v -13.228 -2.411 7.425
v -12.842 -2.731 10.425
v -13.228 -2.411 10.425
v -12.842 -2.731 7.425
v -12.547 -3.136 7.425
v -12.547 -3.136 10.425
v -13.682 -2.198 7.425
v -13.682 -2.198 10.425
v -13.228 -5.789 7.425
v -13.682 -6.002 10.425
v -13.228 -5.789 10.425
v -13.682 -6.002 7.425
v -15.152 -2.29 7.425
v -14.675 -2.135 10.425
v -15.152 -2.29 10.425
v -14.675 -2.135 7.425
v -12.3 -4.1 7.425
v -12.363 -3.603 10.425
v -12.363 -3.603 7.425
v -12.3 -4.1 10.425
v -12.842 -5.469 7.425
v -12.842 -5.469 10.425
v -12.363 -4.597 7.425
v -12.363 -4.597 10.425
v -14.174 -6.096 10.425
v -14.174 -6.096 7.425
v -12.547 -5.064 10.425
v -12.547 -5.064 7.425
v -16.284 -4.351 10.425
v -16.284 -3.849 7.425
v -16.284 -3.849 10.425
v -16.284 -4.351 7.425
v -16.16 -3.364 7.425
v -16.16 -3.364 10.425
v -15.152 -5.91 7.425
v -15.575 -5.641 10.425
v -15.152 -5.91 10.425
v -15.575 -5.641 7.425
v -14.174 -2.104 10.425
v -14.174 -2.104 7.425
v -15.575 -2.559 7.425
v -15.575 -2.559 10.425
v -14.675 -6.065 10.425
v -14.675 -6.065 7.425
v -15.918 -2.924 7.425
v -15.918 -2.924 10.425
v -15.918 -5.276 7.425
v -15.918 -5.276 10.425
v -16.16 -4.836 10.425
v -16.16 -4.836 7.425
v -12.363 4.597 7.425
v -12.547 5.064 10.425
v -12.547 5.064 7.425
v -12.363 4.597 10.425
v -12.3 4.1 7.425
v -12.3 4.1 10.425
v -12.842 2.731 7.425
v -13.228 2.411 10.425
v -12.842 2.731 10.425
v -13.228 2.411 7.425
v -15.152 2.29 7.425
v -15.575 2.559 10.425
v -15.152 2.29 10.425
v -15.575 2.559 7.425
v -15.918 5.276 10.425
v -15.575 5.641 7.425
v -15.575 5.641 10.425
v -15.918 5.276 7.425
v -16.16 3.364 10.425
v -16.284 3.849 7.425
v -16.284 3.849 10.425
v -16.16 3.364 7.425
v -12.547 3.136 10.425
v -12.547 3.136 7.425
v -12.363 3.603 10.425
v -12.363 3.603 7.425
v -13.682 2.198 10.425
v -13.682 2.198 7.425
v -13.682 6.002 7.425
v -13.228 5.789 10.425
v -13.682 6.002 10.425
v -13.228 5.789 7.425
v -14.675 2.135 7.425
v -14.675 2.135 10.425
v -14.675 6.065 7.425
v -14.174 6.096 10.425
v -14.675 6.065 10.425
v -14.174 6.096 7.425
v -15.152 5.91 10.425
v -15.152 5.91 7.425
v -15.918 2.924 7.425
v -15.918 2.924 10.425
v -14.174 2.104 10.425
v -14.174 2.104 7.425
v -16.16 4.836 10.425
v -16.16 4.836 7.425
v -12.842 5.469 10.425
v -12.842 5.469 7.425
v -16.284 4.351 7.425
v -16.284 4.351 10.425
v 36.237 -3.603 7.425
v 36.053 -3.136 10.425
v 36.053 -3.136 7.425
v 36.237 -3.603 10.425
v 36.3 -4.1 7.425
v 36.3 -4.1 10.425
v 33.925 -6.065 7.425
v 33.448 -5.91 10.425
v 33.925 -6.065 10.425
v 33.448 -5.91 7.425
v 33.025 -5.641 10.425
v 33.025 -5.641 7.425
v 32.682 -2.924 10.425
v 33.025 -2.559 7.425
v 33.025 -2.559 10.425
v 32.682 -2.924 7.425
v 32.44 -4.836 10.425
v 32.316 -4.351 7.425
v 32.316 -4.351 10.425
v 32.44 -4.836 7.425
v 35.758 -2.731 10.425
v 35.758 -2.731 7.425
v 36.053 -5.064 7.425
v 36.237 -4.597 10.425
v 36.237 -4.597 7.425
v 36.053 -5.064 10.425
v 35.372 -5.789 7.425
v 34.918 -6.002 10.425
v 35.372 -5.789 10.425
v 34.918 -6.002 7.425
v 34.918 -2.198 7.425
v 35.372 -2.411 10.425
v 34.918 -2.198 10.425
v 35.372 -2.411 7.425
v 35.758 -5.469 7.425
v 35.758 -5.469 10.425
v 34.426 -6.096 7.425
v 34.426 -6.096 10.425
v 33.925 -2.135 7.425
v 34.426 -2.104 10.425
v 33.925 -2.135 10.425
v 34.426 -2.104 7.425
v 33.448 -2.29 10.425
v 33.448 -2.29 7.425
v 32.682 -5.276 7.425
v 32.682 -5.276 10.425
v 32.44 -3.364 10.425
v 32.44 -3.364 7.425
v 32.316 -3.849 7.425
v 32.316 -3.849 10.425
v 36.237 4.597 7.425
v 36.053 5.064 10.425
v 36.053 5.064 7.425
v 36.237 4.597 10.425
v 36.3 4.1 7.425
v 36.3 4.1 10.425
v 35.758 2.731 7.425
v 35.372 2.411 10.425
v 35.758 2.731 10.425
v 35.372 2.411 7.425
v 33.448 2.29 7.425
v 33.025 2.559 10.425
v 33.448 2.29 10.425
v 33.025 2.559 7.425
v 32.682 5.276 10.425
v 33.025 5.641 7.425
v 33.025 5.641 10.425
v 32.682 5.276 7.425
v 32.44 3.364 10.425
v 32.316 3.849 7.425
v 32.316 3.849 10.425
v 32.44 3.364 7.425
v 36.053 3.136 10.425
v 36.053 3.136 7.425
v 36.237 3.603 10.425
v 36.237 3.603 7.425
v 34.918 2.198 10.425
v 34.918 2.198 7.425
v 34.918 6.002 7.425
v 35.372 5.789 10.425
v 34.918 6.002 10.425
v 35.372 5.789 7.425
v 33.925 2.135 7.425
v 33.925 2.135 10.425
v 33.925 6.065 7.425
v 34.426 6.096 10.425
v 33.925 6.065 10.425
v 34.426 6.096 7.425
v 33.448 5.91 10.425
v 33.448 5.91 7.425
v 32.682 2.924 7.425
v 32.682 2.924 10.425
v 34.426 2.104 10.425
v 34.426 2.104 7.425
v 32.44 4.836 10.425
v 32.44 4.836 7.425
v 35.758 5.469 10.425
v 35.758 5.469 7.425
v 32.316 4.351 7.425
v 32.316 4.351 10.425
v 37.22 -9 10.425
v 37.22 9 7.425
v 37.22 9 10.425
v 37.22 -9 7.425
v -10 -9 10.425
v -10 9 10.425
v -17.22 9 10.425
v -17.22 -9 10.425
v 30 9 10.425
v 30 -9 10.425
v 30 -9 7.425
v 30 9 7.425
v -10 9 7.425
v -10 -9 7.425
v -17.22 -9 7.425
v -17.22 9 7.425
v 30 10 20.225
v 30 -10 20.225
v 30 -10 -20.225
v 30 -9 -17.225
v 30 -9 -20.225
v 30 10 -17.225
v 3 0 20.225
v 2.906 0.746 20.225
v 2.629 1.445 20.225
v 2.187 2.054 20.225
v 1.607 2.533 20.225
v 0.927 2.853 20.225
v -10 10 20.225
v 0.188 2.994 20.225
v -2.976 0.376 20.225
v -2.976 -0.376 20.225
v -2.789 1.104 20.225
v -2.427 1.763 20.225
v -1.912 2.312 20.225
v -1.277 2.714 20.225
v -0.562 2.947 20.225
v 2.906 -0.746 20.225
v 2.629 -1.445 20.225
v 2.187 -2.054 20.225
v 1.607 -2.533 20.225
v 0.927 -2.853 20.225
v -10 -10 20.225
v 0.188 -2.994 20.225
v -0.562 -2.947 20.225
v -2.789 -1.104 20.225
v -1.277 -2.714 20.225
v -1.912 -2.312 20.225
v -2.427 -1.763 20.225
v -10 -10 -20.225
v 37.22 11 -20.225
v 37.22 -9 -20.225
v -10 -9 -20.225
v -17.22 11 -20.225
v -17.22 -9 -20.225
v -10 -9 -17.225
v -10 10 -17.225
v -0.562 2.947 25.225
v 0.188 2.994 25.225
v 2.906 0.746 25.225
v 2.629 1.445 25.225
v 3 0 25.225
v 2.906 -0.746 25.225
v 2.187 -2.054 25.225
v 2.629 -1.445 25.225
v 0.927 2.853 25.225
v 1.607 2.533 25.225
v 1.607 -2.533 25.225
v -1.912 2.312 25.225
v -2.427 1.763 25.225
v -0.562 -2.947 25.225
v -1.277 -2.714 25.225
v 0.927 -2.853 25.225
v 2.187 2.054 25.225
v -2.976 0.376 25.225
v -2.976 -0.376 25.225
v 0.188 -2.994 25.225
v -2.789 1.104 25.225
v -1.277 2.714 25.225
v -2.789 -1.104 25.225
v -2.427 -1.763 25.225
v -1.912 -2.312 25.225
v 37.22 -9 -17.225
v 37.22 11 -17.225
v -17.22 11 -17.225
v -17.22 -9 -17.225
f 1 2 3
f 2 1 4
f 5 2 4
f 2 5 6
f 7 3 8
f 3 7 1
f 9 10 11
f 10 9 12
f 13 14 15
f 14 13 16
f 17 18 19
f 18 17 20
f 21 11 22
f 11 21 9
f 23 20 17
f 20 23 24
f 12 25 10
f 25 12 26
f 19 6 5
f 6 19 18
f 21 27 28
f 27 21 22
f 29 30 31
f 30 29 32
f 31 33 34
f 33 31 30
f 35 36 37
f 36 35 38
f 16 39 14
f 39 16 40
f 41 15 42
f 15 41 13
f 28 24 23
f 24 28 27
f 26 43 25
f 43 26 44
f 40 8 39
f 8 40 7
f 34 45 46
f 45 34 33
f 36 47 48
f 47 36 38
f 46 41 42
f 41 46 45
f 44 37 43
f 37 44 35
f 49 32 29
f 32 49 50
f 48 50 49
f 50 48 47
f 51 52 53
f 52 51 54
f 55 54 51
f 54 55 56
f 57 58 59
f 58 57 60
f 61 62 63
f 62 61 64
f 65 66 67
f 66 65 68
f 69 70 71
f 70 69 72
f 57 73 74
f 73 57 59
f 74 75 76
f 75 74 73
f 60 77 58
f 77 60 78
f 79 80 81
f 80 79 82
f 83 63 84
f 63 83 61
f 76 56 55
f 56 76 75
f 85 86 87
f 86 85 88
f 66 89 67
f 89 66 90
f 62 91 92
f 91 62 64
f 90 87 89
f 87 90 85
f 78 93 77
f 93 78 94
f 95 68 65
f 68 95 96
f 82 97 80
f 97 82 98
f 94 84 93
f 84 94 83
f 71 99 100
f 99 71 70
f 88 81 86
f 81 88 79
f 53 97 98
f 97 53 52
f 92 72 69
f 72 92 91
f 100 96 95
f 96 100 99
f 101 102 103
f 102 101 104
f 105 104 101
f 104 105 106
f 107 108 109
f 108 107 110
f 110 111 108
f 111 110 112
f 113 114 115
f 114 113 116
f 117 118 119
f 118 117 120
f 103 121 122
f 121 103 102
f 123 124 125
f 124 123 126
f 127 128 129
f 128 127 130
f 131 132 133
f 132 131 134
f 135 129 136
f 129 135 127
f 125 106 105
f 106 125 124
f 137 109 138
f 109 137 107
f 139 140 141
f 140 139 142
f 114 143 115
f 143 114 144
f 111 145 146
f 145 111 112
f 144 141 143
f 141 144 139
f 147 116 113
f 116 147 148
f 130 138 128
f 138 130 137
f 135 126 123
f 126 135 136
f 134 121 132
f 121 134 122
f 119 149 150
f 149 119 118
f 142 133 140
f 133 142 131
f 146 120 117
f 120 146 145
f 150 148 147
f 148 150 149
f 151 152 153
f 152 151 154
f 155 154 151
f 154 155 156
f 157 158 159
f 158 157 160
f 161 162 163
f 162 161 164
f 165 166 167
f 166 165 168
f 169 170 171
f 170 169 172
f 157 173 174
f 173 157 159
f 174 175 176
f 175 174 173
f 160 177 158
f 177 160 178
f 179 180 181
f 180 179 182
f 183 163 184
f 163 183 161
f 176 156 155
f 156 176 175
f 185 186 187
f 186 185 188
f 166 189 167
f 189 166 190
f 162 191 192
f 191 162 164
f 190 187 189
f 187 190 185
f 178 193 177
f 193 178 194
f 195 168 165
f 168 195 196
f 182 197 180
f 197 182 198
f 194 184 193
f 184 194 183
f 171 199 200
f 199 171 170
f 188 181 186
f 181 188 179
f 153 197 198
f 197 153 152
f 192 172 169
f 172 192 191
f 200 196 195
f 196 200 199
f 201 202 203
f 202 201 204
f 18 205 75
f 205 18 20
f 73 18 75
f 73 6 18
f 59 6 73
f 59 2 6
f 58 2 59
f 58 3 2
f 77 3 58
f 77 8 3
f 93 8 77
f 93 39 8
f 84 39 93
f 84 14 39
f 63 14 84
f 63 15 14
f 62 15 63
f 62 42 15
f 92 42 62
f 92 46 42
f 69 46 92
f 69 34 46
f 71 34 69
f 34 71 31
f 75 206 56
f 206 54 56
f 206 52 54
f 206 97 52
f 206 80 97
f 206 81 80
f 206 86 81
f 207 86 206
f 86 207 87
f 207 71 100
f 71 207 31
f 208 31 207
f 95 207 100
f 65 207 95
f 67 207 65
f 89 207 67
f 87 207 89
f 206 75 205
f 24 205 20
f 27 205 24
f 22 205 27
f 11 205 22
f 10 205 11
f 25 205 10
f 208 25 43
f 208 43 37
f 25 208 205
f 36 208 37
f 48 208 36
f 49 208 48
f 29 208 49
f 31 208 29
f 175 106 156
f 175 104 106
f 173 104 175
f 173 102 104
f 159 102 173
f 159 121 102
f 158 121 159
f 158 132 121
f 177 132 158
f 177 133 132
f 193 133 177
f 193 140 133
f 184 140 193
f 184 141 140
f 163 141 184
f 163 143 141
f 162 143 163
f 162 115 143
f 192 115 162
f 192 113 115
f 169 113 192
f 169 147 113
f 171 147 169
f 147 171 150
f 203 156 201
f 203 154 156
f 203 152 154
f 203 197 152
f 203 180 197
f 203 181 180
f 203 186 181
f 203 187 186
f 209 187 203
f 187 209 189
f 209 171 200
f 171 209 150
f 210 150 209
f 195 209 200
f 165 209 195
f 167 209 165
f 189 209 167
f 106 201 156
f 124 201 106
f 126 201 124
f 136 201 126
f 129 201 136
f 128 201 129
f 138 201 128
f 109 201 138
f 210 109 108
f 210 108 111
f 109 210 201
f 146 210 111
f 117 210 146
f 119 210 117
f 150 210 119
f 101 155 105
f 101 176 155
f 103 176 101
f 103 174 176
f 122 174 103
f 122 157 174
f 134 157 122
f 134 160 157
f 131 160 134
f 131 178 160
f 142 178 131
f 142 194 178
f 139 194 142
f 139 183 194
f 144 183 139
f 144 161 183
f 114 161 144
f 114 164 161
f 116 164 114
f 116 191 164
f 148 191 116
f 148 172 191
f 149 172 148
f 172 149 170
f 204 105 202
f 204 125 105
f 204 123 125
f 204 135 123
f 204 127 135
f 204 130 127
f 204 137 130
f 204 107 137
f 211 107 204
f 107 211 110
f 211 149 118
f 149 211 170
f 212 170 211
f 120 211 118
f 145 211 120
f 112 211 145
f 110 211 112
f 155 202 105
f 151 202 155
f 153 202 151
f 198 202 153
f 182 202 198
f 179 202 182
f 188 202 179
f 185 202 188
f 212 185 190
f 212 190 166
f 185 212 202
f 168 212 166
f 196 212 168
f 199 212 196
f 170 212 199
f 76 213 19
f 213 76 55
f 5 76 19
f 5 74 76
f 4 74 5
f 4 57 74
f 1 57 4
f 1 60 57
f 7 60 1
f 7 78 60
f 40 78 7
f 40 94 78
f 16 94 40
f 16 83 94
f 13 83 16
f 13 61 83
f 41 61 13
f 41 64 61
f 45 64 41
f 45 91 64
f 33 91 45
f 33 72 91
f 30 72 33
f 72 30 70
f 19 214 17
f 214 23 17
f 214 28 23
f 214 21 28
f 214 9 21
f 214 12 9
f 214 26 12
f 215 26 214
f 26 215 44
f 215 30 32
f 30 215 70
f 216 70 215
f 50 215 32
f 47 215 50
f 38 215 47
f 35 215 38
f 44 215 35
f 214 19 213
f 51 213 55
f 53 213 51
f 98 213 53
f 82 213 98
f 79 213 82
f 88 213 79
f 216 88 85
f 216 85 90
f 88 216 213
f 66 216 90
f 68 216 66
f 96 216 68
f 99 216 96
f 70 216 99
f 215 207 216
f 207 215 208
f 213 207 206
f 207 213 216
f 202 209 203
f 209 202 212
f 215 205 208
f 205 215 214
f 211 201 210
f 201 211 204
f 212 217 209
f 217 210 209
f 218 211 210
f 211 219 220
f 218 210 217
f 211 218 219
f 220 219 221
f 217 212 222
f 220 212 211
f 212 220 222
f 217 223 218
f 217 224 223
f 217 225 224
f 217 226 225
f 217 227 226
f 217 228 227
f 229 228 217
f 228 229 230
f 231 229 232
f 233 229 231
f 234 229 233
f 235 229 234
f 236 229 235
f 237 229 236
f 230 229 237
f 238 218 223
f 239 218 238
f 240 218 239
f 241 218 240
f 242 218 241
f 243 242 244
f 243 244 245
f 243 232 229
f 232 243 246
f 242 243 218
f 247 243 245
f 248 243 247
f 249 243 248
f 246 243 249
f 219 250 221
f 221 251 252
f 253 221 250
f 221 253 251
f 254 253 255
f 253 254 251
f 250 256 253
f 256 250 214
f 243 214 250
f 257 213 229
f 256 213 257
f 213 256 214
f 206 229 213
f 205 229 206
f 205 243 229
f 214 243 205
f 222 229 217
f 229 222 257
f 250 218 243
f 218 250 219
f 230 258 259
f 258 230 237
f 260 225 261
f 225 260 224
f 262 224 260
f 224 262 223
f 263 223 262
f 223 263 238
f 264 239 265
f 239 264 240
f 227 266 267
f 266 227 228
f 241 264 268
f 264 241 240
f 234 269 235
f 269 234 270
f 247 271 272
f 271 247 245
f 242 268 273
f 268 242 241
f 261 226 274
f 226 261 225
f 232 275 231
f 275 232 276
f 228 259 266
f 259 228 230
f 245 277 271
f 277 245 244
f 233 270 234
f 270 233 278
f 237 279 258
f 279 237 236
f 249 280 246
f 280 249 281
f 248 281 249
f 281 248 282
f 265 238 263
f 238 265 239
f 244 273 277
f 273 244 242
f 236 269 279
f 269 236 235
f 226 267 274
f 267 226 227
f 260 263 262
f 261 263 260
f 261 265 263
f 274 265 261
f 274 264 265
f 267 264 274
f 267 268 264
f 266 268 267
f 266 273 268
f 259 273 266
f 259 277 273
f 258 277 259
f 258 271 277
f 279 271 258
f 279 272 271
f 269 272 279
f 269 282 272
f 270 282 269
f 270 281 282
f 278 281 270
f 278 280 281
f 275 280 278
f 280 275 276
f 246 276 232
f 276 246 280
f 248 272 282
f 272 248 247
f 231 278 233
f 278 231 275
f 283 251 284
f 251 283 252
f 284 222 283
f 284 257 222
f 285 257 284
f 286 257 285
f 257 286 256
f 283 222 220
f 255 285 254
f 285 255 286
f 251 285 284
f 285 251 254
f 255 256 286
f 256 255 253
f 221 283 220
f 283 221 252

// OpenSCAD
// file: servo1.scad
include <dimensions1.scad>;

module servo(servo_alpha) {
    
    union() {
    
        //body
        color("gray", servo_alpha)
            translate([-servo_size[1] / 2, -servo_size[1] / 2, -servo_size[2] / 2])
                cube(servo_size);
        
        
        // holder
        difference() {

            // holder plate
            _holder_pos_z = servo_holder_h - servo_size[2] / 2;
            _holder_size_w = servo_size[0] + servo_holder_size[0] * 2;
            color("red", servo_alpha)
                translate([-(servo_size[1] / 2 + servo_holder_size[0]),
                        -servo_holder_size[1] / 2,
                        _holder_pos_z])
                    cube([_holder_size_w, servo_holder_size[1], servo_holder_size[2]]);
            
            
            // holder holes
            _hole_pos_x1 = -(servo_size[1] / 2 + servo_holder_hole_pos[0]);
            _hole_pos_x2 = servo_size[0] -servo_size[1] / 2 + servo_holder_hole_pos[0];
            _hole_pos_z = (servo_holder_h - servo_size[2] / 2) - 1; // "-1" - correction for hole
            _hole_h = servo_holder_size[2] + 2; // "2=1*2" - correction for hole
            color("green", servo_alpha) {
                translate([_hole_pos_x1, -servo_holder_hole_pos[1], _hole_pos_z])
                    cylinder(h = _hole_h, r = servo_holder_hole_radius);
                translate([_hole_pos_x1, servo_holder_hole_pos[1], _hole_pos_z])
                    cylinder(h = _hole_h, r = servo_holder_hole_radius);
                
                translate([_hole_pos_x2, -servo_holder_hole_pos[1], _hole_pos_z])
                    cylinder(h = _hole_h, r = servo_holder_hole_radius);
                translate([_hole_pos_x2, servo_holder_hole_pos[1], _hole_pos_z])
                    cylinder(h = _hole_h, r = servo_holder_hole_radius);
            }
            
        }
        
        // pin
        color("gold", servo_alpha)
            translate([0, 0, servo_size[2]/2 - 1]) // "-1" - correction for intersection
                cylinder(h = servo_pin_hight + 1, r = servo_pin_radius); // "+1" - correction for intersection
        
    }

}

// servo(0.5);
// file: dimensions1.scad
$fn = 25;

servo_size = [40, 20, 40.45];

servo_holder_size = [7.22, 18, 3];
servo_holder_h = 27.65;
servo_holder_hole_pos = [4.3, 4.1];
servo_holder_hole_radius = 2;

servo_pin_hight = 5;
servo_pin_radius = 3;

////////

servo_air_space = 1; // between servo and dynamic holder
material_thickness = 3;
air_space = 0.5; // between servo and static holder

////////

tibia_holder_thickness = 5;

////////

coxa_holder_thickness = 5;

////////

body_holder_thickness = 5;

////////

coxa = 50;
femur = 100;
tibia = 180;

/////////

coxa_angle = 0;
femur_angle = -45;
tibia_angle = 90;
// main file
include <dimensions1.scad>;
include <servo1.scad>;

module servo2(servo_alpha) {
    
        //translate([0, 0, material_thickness])
        servo(servo_alpha);
            
        _holder_size_w = servo_size[0] + servo_holder_size[0] * 2;
        color("red", servo_alpha)
            translate([-(servo_size[1] / 2 + servo_holder_size[0]),
                    -servo_holder_size[1] / 2,
                    -(servo_size[2] / 2 )])
                cube([_holder_size_w, servo_size[1], material_thickness]);
        


}

servo2(0.5);
